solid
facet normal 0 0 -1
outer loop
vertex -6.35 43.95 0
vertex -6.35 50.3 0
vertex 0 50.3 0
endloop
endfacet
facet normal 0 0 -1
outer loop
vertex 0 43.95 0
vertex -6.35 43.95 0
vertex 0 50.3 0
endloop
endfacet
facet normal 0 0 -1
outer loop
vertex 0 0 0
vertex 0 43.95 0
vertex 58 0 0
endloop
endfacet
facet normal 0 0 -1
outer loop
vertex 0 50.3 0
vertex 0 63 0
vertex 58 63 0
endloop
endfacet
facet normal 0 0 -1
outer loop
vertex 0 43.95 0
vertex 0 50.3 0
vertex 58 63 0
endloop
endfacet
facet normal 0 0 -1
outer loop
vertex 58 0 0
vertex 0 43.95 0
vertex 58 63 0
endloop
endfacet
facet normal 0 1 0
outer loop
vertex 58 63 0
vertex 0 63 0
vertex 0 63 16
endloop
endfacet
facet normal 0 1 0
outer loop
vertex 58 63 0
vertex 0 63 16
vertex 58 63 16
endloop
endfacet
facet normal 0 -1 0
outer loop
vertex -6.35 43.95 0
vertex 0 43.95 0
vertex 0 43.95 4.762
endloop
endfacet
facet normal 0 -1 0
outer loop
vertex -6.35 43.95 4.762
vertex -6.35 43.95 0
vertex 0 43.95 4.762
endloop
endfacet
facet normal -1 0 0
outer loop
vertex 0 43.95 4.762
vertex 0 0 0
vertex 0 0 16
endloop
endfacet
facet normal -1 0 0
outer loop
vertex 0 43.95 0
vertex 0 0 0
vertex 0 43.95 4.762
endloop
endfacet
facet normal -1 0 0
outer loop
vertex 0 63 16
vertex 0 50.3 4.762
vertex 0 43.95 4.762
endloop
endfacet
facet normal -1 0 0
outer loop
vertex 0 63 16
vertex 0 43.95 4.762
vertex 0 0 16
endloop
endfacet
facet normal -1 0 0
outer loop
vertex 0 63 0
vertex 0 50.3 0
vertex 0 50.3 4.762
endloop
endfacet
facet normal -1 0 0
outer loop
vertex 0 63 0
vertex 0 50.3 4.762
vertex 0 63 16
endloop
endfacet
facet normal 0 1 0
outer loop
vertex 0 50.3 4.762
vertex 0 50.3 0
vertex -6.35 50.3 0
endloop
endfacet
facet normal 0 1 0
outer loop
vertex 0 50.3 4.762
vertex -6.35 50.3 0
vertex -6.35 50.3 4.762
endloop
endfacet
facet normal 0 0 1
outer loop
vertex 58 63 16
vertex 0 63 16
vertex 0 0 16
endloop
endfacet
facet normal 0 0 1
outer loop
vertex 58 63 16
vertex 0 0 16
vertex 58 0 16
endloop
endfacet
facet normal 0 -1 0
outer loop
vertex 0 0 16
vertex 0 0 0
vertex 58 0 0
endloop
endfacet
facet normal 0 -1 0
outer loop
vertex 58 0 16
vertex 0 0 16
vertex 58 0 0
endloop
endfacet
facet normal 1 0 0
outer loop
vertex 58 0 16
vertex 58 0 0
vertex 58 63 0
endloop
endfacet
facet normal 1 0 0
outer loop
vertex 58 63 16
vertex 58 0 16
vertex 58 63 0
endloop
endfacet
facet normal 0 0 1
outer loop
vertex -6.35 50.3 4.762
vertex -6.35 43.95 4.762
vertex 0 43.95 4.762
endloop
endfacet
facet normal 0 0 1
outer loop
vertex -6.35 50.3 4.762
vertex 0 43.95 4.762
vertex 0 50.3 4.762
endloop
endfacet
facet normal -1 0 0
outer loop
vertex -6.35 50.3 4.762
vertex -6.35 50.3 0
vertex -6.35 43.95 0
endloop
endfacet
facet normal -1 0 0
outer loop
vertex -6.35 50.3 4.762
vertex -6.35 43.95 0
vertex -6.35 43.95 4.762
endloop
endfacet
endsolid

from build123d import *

# Parameters (mm, degrees)
SKETCH1_W           = 58
SKETCH1_H           = 63
BOSS_EXTRUDE1_DEPTH = 16
SKETCH2_W           = 4.7625
SKETCH2_H           = 6.35
BOSS_EXTRUDE2_DEPTH = 6.35


with BuildPart() as part:
    # Sketch1 → Boss-Extrude1 (new body)
    with BuildSketch(Plane.XY):
        with Locations((29, 31.5)):
            Rectangle(SKETCH1_W, SKETCH1_H)
    extrude(amount=BOSS_EXTRUDE1_DEPTH)

    # Sketch2 → Boss-Extrude2 (add)
    with BuildSketch(Plane.ZY):
        with Locations((2.38125, 47.125)):
            Rectangle(SKETCH2_W, SKETCH2_H)
    extrude(amount=BOSS_EXTRUDE2_DEPTH)


solid = part.part
